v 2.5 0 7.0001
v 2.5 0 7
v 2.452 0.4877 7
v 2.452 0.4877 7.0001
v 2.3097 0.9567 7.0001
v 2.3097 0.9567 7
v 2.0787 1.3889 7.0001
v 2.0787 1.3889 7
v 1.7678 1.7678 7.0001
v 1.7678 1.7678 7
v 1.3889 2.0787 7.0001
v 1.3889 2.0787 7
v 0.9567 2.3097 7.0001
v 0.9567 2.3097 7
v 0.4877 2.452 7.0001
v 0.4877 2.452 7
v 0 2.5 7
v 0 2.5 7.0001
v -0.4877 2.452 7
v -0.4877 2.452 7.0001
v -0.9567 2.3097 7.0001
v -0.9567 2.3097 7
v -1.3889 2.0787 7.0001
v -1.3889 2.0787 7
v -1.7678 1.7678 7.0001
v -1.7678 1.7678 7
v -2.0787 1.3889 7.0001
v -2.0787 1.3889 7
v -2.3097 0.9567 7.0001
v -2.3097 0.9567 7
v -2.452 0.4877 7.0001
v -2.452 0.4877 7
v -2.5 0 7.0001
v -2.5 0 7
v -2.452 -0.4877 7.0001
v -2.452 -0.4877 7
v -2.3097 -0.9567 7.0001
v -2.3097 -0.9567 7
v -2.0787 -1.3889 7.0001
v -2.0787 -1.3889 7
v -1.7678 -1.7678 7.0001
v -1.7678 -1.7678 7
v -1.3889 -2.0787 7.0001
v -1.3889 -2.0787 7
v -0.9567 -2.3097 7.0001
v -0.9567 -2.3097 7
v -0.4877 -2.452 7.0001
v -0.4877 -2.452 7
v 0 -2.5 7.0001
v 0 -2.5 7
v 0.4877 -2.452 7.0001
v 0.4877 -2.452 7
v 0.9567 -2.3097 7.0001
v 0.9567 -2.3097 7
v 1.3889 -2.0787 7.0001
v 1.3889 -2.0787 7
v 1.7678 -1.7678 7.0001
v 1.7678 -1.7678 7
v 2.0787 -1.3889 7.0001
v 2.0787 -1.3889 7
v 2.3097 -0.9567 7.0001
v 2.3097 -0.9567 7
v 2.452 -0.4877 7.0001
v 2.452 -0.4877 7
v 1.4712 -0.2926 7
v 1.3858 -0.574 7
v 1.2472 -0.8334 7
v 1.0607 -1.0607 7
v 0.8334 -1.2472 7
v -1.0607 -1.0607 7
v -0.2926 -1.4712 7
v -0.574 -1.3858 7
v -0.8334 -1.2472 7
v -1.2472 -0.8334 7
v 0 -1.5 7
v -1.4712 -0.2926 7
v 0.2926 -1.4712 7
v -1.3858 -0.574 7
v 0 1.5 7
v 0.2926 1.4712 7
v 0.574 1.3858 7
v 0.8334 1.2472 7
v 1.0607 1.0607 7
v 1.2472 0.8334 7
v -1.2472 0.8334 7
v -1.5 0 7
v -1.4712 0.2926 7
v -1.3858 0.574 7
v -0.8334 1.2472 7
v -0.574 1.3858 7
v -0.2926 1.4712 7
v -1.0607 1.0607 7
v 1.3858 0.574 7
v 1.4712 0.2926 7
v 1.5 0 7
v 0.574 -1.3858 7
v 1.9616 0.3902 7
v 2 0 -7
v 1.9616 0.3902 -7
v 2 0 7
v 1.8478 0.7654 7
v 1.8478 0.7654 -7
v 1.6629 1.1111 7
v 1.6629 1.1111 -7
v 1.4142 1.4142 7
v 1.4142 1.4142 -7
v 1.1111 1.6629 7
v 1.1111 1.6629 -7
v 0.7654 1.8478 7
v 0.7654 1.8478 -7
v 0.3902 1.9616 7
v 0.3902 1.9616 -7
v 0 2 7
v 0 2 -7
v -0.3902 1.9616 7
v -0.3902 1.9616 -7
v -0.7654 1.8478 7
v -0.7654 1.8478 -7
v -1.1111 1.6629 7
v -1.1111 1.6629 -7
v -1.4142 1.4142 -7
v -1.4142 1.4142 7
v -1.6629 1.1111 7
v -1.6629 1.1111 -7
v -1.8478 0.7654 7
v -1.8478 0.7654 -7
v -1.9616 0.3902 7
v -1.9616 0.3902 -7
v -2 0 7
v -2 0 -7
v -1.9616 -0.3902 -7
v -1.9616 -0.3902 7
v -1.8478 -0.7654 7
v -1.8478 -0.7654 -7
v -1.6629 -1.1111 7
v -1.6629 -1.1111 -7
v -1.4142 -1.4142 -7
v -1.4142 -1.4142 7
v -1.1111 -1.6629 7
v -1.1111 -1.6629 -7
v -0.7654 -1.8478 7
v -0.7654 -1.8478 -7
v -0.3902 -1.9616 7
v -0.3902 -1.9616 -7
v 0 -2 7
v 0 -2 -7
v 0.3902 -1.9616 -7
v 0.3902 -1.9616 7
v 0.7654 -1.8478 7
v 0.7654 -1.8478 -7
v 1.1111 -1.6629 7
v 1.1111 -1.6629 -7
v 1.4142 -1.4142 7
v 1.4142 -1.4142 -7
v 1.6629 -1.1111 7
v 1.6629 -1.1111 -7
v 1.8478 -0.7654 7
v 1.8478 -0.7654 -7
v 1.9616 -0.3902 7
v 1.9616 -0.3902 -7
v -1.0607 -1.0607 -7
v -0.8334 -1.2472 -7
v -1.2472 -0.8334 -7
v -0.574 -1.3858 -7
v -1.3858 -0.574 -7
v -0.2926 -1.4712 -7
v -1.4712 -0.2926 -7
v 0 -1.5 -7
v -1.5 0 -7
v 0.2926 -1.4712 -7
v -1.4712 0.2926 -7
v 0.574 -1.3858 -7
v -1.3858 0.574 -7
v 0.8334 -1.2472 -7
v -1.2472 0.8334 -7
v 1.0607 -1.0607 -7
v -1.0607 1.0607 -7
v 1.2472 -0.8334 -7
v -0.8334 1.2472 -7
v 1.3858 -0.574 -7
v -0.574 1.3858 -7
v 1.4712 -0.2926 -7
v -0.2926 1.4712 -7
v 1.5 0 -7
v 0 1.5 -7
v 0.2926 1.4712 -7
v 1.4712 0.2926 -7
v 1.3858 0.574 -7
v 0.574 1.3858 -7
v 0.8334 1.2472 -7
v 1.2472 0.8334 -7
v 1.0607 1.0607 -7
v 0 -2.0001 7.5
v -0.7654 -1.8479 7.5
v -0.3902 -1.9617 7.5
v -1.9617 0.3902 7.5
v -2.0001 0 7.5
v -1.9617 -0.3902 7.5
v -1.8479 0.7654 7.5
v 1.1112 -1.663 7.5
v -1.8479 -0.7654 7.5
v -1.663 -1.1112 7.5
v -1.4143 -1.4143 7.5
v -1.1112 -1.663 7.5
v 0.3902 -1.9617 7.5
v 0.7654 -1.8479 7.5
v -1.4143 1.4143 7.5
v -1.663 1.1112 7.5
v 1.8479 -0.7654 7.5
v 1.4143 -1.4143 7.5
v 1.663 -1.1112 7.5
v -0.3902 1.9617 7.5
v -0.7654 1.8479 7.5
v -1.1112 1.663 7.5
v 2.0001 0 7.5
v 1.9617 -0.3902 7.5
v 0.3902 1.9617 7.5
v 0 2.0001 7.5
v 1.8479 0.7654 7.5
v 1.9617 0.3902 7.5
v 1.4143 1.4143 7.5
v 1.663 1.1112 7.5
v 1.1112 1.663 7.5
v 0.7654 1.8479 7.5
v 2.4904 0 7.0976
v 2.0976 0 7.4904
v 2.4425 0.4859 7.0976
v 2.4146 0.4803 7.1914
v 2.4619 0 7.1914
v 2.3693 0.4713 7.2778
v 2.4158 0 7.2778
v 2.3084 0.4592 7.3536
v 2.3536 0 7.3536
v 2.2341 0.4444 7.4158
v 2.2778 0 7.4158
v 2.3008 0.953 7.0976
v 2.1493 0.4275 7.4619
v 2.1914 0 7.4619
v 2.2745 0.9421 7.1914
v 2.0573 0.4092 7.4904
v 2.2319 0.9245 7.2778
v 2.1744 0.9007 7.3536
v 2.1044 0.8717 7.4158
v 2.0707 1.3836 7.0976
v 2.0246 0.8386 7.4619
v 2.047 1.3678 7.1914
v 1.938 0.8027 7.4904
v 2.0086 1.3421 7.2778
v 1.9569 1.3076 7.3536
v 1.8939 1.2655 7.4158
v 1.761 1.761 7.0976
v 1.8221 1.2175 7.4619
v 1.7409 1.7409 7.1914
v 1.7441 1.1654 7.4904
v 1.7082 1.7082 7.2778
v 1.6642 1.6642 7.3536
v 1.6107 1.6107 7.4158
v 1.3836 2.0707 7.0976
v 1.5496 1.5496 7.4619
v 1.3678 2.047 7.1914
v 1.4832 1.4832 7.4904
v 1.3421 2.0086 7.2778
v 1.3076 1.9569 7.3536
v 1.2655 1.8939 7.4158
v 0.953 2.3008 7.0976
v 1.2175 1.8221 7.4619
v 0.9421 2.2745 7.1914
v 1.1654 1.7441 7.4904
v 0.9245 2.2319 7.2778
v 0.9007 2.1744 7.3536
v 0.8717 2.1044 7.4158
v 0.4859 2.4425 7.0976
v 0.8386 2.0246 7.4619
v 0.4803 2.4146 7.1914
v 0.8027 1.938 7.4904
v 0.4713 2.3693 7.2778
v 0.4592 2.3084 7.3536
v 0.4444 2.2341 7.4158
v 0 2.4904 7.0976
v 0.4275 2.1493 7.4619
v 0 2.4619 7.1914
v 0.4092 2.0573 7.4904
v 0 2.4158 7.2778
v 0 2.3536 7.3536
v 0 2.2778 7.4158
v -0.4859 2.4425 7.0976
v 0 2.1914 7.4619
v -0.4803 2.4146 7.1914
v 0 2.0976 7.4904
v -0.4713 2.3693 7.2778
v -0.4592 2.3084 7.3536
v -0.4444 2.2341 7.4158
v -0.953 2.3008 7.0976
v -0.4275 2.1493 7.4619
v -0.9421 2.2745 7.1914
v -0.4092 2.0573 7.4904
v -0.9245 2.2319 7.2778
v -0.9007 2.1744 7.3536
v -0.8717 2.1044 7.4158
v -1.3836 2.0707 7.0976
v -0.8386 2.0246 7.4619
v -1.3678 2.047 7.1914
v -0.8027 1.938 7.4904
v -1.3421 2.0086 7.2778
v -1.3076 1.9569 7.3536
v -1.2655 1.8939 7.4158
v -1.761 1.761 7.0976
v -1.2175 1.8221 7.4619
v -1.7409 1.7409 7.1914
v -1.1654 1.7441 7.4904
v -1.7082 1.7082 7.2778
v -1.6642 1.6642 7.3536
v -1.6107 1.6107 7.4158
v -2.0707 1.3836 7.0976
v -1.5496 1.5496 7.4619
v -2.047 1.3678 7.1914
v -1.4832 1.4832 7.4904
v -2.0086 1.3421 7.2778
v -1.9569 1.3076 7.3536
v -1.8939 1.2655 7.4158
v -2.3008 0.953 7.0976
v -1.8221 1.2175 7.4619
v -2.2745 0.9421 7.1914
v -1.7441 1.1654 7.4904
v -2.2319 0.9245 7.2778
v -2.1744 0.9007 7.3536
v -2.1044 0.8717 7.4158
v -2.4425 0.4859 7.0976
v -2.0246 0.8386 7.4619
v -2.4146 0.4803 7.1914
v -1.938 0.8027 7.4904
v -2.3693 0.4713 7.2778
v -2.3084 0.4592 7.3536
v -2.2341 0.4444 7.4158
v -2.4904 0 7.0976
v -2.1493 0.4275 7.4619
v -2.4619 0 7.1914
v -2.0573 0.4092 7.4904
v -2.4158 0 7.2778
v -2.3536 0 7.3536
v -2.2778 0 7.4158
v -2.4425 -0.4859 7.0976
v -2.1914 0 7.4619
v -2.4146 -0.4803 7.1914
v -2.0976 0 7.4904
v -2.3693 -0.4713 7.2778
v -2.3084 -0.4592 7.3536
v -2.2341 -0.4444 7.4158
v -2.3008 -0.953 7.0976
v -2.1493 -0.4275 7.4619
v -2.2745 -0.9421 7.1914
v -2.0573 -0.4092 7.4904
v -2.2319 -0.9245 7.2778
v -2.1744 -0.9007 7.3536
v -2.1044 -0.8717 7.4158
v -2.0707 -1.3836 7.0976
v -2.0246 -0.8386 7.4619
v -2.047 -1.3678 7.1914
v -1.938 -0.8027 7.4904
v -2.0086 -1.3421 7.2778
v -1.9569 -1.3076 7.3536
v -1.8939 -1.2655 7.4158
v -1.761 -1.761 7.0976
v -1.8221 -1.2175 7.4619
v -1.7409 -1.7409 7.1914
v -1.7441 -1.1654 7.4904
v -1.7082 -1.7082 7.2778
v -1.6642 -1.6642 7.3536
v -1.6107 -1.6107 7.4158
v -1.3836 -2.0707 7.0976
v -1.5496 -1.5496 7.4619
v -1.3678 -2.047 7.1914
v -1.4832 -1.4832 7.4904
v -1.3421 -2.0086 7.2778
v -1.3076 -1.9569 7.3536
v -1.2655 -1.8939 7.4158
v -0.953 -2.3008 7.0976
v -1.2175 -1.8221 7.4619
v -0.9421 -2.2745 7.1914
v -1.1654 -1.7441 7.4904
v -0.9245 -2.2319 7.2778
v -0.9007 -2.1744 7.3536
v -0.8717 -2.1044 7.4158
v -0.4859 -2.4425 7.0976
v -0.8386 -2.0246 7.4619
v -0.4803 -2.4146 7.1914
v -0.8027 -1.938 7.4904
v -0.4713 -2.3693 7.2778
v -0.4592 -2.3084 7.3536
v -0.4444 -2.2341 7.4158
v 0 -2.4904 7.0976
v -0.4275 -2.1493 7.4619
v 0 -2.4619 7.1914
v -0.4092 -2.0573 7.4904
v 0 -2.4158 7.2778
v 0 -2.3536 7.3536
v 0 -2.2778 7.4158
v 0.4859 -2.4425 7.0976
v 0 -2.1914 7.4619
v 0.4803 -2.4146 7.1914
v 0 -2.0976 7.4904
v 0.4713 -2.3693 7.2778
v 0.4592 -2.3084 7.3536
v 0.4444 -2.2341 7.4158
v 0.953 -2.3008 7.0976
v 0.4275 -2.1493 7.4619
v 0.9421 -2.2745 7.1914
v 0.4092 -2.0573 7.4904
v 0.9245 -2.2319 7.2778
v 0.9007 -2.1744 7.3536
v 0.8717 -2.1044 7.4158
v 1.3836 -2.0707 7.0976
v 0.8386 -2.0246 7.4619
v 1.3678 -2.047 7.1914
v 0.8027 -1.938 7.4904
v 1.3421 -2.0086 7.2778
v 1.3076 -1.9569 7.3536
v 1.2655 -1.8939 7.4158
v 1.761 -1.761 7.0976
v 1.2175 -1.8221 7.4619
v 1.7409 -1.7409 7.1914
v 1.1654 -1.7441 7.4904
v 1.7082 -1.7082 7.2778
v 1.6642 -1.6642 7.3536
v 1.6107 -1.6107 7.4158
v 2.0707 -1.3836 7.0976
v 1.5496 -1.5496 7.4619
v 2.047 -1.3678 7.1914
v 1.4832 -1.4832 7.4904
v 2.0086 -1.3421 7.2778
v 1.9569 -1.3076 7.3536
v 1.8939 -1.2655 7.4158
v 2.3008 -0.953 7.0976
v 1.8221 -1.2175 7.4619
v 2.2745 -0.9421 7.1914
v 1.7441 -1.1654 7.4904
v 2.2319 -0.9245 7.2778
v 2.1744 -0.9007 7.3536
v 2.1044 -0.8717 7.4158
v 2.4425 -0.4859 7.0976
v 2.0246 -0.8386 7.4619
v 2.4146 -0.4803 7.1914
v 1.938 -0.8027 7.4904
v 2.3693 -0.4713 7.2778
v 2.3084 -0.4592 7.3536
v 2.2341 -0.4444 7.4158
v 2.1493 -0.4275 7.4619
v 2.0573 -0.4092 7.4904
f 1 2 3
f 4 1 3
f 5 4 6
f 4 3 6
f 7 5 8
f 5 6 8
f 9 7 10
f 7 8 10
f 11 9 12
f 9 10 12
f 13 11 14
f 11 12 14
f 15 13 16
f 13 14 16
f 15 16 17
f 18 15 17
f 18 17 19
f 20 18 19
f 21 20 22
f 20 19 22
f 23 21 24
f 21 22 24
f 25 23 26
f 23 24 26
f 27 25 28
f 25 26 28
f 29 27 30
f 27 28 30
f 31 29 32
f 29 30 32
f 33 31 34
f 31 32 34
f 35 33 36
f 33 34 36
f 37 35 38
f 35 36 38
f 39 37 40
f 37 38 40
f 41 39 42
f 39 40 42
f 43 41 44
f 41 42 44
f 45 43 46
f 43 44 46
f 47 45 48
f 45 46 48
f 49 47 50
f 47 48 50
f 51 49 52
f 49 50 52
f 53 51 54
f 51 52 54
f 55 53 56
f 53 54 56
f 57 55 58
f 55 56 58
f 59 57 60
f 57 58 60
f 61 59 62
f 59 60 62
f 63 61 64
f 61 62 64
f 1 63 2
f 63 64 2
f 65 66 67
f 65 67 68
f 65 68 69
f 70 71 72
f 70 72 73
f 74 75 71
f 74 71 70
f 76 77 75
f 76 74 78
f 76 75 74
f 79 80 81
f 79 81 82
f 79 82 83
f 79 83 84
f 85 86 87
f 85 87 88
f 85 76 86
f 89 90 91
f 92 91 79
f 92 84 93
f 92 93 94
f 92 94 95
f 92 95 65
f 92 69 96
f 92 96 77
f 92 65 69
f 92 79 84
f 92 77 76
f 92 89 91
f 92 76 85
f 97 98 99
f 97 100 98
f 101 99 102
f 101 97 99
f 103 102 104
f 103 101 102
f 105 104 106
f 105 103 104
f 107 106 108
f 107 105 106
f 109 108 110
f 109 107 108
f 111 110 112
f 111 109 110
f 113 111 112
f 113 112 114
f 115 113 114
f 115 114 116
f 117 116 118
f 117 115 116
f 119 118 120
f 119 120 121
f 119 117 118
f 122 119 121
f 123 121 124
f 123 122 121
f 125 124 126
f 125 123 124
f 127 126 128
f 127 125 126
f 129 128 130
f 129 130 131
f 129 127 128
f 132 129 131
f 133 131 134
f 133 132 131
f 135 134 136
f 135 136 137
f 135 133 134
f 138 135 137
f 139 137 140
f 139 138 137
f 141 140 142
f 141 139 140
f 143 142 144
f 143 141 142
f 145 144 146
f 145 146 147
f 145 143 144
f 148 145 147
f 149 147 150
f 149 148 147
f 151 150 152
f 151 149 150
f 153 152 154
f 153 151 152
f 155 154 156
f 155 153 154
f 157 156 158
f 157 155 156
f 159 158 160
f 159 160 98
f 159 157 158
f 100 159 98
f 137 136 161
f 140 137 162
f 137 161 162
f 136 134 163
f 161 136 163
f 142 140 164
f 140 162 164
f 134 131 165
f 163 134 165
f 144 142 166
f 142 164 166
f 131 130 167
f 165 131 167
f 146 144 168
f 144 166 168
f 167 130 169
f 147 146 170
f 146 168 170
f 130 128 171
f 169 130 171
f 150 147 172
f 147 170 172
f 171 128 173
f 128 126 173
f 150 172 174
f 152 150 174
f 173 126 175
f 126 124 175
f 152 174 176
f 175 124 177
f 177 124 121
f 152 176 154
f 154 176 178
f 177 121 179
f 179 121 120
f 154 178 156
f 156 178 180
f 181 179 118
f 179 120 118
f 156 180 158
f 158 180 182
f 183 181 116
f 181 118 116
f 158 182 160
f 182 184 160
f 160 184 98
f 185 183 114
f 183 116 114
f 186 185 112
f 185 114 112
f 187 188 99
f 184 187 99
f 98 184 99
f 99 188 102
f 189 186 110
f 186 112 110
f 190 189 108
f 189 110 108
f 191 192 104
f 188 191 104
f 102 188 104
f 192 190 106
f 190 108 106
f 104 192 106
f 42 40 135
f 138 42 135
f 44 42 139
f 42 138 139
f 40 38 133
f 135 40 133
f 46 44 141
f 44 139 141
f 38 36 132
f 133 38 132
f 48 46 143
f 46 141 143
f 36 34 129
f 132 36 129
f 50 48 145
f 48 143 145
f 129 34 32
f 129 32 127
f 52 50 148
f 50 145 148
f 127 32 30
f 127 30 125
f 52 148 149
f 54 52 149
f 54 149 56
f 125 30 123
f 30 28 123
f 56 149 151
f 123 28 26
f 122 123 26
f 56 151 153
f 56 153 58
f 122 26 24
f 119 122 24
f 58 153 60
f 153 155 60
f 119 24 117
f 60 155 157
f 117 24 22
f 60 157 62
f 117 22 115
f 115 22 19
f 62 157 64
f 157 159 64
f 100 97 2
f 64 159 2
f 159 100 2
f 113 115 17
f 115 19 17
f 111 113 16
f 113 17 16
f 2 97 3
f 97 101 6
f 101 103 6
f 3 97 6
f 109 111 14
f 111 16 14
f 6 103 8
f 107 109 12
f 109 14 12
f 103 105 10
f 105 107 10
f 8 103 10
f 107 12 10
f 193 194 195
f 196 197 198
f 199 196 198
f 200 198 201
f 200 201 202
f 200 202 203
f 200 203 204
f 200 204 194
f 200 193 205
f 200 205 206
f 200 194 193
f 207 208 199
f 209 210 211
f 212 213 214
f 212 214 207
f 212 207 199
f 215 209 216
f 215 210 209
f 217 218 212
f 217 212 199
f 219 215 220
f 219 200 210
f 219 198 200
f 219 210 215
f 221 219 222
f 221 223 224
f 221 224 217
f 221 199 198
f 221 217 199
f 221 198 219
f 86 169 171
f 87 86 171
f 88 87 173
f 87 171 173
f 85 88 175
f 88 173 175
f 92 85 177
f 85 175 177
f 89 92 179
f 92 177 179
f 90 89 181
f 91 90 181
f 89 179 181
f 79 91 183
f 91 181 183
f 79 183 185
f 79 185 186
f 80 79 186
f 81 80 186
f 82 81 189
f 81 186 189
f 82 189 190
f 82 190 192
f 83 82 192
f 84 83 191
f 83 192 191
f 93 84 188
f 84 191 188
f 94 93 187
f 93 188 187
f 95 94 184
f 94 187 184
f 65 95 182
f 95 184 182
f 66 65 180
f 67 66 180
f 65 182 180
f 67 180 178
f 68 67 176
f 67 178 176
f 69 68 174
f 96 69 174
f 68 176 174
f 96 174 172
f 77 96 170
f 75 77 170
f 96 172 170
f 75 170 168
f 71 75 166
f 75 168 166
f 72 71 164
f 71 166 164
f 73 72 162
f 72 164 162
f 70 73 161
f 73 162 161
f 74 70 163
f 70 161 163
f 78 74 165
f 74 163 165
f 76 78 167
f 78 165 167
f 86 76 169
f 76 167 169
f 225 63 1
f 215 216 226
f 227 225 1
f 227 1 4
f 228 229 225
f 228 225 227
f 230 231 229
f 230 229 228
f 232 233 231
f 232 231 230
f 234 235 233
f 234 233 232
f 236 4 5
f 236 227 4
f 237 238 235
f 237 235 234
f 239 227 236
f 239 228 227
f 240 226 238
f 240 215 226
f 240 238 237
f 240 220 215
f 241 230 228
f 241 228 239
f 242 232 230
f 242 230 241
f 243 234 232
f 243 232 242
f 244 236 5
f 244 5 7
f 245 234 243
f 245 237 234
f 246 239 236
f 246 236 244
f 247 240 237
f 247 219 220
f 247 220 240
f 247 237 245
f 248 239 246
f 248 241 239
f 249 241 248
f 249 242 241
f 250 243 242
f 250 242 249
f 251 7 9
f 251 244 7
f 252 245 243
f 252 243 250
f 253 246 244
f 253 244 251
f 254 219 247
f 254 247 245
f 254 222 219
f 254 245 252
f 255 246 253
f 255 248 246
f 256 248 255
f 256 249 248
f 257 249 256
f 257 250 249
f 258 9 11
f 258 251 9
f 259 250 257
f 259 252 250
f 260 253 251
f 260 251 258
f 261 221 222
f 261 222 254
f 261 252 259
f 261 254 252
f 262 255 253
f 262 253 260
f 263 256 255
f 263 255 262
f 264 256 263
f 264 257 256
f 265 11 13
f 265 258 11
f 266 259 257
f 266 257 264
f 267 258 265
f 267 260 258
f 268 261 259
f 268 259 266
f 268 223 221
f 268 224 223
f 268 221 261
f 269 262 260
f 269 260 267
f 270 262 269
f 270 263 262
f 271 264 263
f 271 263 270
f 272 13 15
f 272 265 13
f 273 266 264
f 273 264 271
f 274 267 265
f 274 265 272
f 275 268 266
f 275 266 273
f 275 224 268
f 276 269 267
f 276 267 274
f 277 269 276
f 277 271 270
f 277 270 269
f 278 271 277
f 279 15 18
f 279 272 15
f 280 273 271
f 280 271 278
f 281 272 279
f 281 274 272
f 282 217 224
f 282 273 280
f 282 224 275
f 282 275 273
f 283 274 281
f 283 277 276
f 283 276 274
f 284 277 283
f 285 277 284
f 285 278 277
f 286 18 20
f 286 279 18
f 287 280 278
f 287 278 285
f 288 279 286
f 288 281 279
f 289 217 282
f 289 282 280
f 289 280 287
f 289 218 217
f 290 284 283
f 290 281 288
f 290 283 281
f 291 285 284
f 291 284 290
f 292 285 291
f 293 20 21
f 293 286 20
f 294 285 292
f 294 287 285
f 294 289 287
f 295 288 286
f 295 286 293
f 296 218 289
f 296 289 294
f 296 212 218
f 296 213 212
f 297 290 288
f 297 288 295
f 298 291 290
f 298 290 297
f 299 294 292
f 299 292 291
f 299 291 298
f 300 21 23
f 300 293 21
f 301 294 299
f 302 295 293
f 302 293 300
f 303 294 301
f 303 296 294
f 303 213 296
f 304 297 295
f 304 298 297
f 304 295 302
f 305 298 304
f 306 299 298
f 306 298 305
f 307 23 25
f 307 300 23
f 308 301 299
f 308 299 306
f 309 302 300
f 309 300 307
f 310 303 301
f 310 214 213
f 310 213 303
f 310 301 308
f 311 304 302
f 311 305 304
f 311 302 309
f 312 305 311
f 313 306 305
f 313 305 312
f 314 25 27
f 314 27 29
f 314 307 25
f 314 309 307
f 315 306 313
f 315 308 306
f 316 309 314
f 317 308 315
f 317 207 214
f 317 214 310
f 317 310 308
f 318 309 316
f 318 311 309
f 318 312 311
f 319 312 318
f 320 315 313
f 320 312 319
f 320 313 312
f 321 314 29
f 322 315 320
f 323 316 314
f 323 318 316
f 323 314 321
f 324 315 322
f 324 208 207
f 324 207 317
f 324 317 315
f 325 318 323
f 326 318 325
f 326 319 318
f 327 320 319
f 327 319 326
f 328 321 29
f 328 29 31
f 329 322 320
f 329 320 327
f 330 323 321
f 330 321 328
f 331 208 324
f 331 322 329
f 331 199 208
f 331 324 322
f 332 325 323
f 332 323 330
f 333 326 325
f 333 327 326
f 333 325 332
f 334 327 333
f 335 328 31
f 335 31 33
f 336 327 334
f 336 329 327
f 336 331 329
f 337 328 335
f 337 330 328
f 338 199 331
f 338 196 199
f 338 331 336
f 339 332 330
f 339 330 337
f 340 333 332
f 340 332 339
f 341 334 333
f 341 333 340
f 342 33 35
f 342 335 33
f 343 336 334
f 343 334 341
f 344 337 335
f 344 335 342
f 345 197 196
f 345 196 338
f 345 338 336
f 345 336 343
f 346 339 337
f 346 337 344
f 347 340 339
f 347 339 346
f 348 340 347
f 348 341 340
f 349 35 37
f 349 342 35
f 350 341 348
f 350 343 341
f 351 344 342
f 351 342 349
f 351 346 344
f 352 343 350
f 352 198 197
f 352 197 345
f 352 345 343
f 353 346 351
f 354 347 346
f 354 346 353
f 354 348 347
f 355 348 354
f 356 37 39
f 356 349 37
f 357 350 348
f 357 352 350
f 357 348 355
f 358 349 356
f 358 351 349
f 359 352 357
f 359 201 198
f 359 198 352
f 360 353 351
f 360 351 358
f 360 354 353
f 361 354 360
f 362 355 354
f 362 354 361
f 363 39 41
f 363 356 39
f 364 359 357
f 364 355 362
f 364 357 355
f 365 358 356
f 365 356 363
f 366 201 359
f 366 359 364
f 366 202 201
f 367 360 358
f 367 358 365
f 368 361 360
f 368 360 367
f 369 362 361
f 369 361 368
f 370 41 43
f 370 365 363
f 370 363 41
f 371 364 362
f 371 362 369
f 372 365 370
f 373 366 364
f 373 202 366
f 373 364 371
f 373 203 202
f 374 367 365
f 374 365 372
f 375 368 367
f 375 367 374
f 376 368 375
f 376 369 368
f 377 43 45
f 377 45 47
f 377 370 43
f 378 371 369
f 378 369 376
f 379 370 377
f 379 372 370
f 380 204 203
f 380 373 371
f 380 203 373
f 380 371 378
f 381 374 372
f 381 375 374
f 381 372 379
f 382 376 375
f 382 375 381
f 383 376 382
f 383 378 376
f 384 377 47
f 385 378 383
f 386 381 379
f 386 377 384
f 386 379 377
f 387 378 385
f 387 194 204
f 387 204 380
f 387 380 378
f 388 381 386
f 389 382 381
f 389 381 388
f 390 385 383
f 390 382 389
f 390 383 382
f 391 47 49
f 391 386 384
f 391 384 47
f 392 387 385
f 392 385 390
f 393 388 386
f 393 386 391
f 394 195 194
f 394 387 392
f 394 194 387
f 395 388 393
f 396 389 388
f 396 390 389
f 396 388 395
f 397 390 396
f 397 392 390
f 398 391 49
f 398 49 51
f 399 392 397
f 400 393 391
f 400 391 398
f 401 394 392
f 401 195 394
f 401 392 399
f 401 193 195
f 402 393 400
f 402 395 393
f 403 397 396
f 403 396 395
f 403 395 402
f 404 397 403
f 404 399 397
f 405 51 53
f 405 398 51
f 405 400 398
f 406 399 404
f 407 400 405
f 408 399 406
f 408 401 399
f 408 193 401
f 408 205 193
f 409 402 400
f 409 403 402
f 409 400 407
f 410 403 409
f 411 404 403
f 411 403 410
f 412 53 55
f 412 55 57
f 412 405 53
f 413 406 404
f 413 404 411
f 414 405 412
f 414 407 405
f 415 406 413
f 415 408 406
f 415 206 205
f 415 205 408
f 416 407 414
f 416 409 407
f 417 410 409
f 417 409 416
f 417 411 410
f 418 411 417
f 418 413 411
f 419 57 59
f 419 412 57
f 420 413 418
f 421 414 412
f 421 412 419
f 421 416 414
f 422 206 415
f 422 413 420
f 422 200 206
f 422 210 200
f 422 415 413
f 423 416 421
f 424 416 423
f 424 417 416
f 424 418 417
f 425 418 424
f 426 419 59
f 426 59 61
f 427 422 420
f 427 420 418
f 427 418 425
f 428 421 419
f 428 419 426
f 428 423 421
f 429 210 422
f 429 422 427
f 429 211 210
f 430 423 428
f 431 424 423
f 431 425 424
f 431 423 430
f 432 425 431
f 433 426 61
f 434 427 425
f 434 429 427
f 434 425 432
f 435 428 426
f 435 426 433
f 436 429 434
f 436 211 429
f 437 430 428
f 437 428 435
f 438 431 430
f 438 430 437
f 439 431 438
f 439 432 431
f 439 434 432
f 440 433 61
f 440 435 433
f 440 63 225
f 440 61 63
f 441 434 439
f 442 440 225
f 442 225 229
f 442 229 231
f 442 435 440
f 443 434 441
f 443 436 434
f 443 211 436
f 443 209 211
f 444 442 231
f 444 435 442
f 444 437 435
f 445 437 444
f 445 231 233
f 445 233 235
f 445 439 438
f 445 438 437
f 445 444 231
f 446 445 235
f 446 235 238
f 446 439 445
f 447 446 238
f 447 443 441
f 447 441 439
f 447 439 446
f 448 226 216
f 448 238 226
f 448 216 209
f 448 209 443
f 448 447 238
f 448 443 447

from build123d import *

# Parameters (mm, degrees)
SKETCH_1_R          = 2
EXTRUDE_1_DEPTH     = 7
SKETCH_2_R          = 2.5
EXTRUDE_2_DEPTH     = 0.5
FILLET_1_R          = 0.5
SKETCH_3_R          = 1.5
CUT_EXTRUDE_1_DEPTH = 14


with BuildPart() as part:
    # 草图1 → 凸台-拉伸1 (new, symmetric)
    with BuildSketch(Plane.XY):
        Circle(SKETCH_1_R)
    extrude(amount=EXTRUDE_1_DEPTH, both=True)

    # 草图2 → 凸台-拉伸2 (add)
    with BuildSketch(Plane.XY.offset(7)):
        Circle(SKETCH_2_R)
    extrude(amount=EXTRUDE_2_DEPTH)

    # 圆角1
    fillet_1_edges = [part.edges().sort_by_distance(p)[0] for p in [
        (-2.5, 0, 7.5),
    ]]
    fillet(fillet_1_edges, radius=FILLET_1_R - 0.0001)  # a hair under: the kernel refuses the full size

    # 草图3 → 切除-拉伸1 (cut)
    with BuildSketch(Plane(origin=(0, 0, -7), x_dir=(-1, 0, 0), z_dir=(0, 0, -1))):
        Circle(SKETCH_3_R)
    extrude(amount=-CUT_EXTRUDE_1_DEPTH, mode=Mode.SUBTRACT)


solid = part.part
